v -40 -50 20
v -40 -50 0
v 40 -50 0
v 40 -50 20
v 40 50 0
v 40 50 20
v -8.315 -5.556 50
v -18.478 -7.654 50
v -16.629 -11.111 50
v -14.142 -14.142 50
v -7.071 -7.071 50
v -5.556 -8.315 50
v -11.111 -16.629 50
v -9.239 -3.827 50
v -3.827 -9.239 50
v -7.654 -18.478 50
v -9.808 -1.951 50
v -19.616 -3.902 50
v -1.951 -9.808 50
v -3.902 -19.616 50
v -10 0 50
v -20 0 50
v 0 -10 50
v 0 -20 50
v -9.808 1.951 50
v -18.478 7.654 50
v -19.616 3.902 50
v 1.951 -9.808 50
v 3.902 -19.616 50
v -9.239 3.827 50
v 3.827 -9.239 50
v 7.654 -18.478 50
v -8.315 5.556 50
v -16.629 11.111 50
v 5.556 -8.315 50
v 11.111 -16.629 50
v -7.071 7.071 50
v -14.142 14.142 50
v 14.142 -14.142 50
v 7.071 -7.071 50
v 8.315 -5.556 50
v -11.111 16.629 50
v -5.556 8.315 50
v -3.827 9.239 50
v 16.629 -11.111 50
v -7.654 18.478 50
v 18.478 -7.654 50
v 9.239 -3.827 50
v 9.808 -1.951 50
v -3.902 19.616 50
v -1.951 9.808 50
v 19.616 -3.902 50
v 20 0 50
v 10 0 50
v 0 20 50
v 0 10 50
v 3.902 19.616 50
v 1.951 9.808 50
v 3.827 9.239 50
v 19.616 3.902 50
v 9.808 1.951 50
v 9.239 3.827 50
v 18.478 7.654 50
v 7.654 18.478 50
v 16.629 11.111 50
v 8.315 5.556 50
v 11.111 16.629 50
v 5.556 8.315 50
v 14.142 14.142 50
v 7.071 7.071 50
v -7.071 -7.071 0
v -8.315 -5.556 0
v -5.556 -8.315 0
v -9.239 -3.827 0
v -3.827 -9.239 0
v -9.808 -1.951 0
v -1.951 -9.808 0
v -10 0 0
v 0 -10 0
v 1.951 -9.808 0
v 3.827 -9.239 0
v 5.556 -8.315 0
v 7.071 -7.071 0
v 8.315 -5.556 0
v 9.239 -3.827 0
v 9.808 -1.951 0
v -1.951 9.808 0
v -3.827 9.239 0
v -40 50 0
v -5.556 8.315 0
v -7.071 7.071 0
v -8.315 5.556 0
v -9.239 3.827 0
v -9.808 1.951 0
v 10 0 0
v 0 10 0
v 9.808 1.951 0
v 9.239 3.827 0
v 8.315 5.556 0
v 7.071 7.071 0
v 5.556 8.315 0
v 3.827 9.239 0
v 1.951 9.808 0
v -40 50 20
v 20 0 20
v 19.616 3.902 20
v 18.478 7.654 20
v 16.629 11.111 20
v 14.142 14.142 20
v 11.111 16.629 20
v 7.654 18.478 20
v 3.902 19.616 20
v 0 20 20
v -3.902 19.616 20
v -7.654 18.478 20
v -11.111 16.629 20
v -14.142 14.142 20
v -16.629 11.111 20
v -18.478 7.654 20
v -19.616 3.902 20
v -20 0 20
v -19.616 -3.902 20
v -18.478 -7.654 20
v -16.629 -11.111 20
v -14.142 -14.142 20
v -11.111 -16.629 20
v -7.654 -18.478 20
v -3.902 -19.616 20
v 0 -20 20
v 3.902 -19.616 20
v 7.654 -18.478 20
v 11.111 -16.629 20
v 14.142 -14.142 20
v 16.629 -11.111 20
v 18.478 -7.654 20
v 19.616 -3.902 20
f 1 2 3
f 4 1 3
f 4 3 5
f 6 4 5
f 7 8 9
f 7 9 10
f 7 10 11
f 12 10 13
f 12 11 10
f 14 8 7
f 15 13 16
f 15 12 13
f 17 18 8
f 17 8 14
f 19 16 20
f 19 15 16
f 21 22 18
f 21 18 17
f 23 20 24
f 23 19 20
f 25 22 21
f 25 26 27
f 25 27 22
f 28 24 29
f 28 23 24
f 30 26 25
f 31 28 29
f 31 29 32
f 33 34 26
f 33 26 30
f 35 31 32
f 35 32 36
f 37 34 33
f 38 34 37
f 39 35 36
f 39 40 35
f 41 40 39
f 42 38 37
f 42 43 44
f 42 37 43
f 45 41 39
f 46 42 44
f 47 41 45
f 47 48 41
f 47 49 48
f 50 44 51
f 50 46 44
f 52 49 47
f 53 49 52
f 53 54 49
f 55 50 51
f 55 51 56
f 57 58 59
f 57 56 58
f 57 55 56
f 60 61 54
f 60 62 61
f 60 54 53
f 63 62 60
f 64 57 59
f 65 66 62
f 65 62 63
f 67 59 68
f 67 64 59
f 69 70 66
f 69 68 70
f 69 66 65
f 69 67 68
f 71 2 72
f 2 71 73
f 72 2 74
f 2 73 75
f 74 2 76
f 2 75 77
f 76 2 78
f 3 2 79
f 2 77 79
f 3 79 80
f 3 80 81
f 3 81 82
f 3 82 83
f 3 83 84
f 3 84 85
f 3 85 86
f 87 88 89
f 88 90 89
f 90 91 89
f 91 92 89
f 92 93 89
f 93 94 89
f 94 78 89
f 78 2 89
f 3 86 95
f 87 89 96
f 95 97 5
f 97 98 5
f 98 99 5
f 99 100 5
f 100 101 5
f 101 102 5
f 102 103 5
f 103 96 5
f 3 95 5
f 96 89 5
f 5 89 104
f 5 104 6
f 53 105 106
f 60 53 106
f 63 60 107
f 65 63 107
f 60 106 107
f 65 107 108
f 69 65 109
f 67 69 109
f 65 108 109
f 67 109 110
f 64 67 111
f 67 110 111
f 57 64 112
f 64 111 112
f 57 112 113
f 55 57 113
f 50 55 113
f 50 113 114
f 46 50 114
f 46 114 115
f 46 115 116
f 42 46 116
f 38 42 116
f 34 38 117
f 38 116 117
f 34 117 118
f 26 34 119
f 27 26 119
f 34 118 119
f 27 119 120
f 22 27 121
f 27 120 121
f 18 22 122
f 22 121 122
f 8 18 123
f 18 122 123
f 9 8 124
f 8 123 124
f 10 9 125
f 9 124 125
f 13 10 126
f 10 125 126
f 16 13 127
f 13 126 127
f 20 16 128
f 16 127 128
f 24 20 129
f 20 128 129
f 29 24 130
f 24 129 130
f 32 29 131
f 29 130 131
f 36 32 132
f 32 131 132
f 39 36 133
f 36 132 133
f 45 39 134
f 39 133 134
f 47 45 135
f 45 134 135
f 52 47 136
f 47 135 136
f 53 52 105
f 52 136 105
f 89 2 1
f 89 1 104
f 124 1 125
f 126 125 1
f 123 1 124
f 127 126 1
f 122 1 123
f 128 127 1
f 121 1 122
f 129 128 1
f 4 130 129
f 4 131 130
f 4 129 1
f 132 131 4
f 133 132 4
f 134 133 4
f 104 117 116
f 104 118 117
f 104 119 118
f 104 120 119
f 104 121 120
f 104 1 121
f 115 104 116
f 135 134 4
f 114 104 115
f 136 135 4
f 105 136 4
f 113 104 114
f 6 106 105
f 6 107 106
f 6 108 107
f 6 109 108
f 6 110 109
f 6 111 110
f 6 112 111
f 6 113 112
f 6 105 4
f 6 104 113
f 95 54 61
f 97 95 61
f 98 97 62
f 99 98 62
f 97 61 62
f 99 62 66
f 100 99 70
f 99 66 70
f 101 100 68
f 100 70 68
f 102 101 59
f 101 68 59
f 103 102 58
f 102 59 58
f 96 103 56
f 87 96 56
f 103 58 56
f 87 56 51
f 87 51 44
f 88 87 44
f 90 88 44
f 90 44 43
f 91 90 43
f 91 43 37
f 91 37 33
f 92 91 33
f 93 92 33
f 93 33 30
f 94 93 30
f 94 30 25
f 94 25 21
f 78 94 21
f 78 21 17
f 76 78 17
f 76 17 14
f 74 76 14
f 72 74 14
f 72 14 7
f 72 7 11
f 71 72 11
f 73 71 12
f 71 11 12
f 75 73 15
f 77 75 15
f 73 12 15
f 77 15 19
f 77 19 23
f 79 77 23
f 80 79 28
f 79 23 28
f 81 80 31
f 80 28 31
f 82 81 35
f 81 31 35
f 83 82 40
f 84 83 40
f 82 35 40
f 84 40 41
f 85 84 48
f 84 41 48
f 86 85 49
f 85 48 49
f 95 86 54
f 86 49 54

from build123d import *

# Parameters (mm, degrees)
ESQUISSE1_W             = 80
ESQUISSE1_H             = 100
BOSS_EXTRU_1_DEPTH      = 20
ESQUISSE2_R             = 20
BOSS_EXTRU_2_DEPTH      = 30
ESQUISSE3_R             = 10
ENL_V_MAT_EXTRU_1_DEPTH = 82.240384046


with BuildPart() as part:
    # Esquisse1 → Boss.-Extru.1 (new body)
    with BuildSketch(Plane.XY):
        Rectangle(ESQUISSE1_W, ESQUISSE1_H)
    extrude(amount=BOSS_EXTRU_1_DEPTH)

    # Esquisse2 → Boss.-Extru.2 (add)
    with BuildSketch(Plane.XY.offset(20)):
        Circle(ESQUISSE2_R)
    extrude(amount=BOSS_EXTRU_2_DEPTH)

    # Esquisse3 → Enlèv. mat.-Extru.1 (cut, through all)
    with BuildSketch(Plane.XY.offset(50)):
        Circle(ESQUISSE3_R)
    extrude(amount=-ENL_V_MAT_EXTRU_1_DEPTH, mode=Mode.SUBTRACT)


solid = part.part
